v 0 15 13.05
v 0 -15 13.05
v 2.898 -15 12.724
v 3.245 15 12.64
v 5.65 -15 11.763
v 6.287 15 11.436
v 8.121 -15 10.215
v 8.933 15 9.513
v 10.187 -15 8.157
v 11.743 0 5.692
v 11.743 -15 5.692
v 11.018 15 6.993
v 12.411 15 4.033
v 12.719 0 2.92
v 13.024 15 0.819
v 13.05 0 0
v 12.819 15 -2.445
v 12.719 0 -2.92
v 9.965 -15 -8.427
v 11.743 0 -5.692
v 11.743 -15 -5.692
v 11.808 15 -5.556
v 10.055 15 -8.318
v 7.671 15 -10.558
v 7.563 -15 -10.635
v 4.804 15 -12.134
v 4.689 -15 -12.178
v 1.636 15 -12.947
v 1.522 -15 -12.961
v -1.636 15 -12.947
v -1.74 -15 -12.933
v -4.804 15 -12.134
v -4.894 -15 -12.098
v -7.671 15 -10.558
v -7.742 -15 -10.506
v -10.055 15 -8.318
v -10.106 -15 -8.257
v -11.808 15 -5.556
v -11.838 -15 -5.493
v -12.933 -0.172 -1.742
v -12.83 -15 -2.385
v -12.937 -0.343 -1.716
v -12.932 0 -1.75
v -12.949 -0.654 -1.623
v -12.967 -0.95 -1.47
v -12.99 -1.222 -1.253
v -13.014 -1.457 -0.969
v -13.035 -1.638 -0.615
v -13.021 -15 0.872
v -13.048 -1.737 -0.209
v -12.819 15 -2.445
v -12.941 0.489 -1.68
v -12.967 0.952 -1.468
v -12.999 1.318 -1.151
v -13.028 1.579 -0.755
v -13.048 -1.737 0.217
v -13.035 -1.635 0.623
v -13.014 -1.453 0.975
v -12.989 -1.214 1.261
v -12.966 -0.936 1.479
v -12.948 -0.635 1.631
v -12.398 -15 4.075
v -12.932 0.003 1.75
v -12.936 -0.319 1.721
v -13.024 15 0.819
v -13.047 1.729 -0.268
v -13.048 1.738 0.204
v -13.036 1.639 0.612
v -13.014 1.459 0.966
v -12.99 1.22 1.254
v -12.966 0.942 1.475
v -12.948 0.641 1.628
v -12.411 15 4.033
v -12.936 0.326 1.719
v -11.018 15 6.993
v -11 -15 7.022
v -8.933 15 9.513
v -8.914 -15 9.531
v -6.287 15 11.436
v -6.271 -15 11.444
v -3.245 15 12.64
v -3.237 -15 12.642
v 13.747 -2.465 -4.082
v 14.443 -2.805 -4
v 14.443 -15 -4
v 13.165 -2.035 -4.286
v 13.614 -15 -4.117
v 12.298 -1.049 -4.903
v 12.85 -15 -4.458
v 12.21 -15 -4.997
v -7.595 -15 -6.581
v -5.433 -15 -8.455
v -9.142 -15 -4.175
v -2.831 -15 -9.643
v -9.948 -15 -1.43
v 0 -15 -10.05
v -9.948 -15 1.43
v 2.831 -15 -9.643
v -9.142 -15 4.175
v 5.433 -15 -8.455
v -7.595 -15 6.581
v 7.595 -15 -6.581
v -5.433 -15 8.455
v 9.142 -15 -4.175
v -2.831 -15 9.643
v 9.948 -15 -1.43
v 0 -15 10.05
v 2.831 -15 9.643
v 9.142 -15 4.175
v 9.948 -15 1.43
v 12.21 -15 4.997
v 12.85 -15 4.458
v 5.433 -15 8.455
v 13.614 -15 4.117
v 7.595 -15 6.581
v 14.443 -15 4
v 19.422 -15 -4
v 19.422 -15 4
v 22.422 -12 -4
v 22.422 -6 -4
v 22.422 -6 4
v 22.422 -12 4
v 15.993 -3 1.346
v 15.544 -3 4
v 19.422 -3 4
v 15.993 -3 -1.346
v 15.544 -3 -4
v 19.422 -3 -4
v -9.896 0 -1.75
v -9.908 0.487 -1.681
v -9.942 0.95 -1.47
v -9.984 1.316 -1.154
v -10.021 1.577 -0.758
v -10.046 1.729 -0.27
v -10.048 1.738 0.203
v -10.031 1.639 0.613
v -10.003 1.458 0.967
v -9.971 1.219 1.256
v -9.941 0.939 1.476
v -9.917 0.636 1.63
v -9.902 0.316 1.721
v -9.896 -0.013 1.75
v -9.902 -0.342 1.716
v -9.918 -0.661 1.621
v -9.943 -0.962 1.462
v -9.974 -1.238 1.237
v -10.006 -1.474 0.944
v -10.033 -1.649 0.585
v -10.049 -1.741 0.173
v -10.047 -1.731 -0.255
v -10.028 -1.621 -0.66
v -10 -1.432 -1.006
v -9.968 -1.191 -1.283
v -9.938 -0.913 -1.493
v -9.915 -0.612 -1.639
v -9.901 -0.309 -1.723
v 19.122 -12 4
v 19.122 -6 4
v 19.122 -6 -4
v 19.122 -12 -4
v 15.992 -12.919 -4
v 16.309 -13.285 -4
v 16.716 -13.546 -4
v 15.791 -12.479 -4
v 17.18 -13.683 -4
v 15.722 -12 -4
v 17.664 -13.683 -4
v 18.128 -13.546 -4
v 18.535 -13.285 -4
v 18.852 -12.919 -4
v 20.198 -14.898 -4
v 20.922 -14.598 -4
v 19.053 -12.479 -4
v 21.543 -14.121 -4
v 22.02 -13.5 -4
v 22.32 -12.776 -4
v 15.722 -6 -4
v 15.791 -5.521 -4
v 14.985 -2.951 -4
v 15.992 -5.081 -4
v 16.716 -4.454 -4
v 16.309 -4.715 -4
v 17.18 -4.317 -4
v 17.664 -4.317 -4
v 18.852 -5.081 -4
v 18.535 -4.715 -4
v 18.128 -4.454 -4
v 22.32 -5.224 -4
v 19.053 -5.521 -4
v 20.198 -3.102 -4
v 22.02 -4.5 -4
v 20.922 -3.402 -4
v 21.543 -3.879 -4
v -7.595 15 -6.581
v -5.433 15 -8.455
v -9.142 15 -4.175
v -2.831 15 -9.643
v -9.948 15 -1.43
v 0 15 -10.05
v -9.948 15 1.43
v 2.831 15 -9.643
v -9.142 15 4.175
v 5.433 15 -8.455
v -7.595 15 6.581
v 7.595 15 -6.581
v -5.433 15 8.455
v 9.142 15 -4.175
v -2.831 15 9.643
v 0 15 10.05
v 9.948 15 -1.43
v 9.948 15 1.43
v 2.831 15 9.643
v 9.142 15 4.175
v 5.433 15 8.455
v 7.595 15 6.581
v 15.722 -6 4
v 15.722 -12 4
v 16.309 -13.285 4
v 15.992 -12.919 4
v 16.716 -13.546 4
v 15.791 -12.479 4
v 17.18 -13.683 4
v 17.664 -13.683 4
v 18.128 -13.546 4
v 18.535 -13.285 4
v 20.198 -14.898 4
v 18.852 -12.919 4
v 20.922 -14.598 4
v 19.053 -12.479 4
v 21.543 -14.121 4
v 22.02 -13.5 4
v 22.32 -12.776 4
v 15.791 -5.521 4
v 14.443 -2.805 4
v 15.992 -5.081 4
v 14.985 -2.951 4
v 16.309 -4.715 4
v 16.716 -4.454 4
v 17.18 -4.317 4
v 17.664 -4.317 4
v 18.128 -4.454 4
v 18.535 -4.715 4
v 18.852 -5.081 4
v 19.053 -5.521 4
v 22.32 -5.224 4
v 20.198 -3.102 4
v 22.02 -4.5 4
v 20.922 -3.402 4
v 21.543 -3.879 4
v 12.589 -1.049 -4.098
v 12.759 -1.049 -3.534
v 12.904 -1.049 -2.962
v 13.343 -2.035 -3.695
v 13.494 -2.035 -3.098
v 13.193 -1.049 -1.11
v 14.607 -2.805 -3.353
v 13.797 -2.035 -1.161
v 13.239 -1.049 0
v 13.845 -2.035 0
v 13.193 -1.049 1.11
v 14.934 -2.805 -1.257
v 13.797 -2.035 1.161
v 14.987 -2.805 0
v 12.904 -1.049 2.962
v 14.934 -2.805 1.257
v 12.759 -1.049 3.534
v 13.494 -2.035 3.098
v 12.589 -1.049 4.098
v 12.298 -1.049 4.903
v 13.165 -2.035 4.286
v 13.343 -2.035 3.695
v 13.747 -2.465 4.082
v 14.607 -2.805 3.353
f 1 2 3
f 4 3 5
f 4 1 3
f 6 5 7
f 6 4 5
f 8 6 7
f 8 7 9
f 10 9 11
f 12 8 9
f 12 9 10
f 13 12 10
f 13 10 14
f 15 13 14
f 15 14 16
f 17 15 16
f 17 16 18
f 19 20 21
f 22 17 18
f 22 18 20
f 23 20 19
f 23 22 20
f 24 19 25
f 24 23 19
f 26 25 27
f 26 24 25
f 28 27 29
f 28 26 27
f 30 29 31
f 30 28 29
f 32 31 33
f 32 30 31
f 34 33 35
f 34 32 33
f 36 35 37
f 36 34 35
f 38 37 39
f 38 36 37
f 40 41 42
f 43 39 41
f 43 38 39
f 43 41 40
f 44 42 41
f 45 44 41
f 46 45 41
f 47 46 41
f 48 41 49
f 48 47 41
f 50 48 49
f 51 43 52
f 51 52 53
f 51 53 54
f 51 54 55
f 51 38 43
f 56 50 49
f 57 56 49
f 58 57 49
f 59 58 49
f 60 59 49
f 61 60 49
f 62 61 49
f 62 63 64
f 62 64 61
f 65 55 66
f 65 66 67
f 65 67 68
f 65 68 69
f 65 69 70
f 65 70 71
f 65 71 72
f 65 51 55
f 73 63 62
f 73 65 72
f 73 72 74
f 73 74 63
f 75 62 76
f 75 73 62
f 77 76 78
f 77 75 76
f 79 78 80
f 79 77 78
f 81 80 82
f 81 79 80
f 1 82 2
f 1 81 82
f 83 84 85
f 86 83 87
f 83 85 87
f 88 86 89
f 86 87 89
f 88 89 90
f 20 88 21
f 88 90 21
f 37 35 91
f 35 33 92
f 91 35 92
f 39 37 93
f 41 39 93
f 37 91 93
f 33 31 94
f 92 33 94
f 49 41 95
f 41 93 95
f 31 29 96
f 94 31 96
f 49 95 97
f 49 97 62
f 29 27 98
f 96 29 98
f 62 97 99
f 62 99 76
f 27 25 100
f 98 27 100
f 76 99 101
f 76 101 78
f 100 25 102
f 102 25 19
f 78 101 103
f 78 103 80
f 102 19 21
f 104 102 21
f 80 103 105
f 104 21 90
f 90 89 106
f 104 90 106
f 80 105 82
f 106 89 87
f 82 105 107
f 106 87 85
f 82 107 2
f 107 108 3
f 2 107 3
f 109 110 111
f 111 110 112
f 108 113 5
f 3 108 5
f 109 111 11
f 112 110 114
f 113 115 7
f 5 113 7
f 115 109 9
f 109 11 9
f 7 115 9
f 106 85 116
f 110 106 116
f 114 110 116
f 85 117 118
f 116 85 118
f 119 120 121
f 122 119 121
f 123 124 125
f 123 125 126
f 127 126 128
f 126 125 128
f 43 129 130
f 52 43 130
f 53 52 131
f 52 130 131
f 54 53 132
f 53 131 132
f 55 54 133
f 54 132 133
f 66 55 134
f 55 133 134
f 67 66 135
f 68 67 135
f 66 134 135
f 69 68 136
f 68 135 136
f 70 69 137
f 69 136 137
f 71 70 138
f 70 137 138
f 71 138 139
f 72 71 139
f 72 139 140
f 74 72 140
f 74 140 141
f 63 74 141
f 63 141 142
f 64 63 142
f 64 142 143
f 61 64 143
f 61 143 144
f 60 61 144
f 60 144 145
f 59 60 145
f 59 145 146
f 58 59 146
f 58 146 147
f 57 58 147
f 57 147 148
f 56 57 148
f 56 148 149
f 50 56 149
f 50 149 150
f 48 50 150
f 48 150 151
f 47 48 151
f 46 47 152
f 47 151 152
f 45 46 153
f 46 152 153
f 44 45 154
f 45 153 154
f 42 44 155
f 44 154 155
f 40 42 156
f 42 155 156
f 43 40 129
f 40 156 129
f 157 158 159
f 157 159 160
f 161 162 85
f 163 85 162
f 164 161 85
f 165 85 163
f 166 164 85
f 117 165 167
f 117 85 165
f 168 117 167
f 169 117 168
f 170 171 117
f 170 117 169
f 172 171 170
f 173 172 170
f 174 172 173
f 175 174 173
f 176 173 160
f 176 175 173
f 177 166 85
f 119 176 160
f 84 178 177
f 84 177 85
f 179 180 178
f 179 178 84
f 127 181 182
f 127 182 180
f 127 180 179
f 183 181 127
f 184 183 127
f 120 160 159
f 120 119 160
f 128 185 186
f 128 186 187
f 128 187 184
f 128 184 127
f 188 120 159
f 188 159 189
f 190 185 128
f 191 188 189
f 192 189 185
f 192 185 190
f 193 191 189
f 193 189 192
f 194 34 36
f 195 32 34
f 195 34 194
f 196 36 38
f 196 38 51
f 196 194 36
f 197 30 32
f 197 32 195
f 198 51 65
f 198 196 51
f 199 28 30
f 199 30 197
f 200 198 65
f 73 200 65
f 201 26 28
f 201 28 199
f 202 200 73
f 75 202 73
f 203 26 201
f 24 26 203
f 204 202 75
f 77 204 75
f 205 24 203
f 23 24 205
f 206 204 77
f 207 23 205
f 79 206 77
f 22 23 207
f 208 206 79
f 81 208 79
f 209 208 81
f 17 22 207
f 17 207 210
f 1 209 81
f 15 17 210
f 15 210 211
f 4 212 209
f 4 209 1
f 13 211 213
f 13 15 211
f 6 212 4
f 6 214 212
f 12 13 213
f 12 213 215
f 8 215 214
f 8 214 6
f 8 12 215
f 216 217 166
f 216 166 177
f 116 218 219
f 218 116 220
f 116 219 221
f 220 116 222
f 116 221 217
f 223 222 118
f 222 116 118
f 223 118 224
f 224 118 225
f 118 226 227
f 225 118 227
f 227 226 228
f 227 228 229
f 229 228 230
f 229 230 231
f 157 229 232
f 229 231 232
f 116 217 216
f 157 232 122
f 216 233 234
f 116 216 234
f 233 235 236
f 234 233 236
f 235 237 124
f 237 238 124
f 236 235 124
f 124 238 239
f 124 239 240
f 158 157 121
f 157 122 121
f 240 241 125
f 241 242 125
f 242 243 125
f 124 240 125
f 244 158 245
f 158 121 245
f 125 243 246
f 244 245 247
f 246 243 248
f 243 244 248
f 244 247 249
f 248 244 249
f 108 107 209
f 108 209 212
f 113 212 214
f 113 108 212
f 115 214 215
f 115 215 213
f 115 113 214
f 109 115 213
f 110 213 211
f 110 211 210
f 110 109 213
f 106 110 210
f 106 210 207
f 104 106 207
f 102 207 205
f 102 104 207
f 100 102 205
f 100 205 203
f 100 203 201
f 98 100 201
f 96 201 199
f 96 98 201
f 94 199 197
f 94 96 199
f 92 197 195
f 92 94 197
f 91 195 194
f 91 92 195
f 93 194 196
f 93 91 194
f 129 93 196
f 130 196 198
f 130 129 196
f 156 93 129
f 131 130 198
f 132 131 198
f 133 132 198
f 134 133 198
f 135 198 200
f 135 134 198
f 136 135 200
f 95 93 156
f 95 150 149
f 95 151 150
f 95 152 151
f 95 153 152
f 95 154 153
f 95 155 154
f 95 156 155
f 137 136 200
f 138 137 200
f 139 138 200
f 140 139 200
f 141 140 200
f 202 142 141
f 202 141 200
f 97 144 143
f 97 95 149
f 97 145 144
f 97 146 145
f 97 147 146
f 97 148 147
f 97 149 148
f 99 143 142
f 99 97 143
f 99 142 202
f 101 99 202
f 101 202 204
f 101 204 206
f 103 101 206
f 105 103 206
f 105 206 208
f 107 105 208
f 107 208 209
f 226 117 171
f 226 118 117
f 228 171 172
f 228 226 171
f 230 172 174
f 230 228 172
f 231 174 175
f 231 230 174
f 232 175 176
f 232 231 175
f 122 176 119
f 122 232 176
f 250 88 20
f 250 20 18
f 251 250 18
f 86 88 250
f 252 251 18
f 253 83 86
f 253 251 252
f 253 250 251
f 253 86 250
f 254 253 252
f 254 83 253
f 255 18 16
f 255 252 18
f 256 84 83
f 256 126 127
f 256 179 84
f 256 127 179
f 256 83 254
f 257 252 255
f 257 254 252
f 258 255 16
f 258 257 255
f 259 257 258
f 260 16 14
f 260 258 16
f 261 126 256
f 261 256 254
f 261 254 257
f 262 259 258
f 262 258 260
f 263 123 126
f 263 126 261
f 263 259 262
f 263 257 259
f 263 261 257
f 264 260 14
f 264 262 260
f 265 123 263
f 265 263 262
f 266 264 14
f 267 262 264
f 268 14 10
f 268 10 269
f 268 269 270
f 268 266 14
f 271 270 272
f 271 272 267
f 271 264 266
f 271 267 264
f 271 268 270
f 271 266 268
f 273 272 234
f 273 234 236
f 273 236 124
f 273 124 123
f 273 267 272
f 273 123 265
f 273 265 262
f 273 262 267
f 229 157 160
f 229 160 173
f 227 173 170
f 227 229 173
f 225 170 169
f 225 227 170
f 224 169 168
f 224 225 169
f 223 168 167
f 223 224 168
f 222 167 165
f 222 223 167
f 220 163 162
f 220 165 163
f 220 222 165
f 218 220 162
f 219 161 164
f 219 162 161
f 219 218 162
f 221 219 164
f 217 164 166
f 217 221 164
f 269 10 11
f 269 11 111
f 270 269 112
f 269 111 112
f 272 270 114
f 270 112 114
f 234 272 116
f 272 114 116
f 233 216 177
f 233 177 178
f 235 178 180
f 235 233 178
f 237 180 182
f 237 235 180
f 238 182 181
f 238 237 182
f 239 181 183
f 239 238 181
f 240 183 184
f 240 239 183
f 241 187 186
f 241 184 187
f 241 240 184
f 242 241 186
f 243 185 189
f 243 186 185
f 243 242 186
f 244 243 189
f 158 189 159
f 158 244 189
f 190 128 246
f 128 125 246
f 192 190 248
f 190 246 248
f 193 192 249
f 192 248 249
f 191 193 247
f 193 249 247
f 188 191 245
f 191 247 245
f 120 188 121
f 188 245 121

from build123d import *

# Parameters (mm, degrees)
SKETCH_1_R             = 13.05
SKETCH_1_R_2           = 10.05
EXTRUDE_1_DEPTH        = 15
EXTRUDE_2_REACH        = 35.782
EXTRUDE_2_START_RADIUS = 13.05
EXTRUDE_2_END_RADIUS   = 13.05
SKETCH_2_W             = 8
SKETCH_2_H             = 12
CUT_EXTRUDE_1_DEPTH    = 33.025068306
CUT_EXTRUDE_2_DEPTH    = 32.913039886
FILLET_1_R             = 3
FILLET_2_R             = 3
SKETCH_6_R             = 1.75
CUT_EXTRUDE_3_DEPTH    = 30.967350938


with BuildPart() as part:
    # 草图1 → 凸台-拉伸1 (new, symmetric)
    with BuildSketch(Plane(origin=(0, 0, 0), x_dir=(1, 0, 0), z_dir=(0, 1, 0))):
        with Locations(Location((0, 0, 0), (0, 0, 270))):
            Circle(SKETCH_1_R)
        with Locations(Location((0, 0, 0), (0, 0, 270))):
            Circle(SKETCH_1_R_2, mode=Mode.SUBTRACT)
    extrude(amount=EXTRUDE_1_DEPTH, both=True)

    # 凸台-拉伸2: from a cylinder face, 35.782 long prism both ways, kept between that surface and its translate by the depth
    extrude_2_start = Plane(origin=(0, -9, 0), z_dir=(0, -1, 0)) * Cylinder(EXTRUDE_2_START_RADIUS, 98.664, mode=Mode.PRIVATE)
    extrude_2_end = Plane(origin=(10, -9, 0), z_dir=(0, -1, 0)) * Cylinder(EXTRUDE_2_END_RADIUS, 98.664, mode=Mode.PRIVATE)
    # 草图2 → 凸台-拉伸2 (add, from a surface)
    with BuildSketch(Plane(origin=(0, 0, 0), x_dir=(0, 0, -1), z_dir=(1, 0, 0)), mode=Mode.PRIVATE) as extrude_2_sk1:
        with Locations((0, -9)):
            Rectangle(SKETCH_2_W, SKETCH_2_H)
    extrude_2_tool1 = extrude(extrude_2_sk1.sketch, amount=EXTRUDE_2_REACH, both=True, mode=Mode.PRIVATE)
    add(((extrude_2_tool1 - extrude_2_start) & extrude_2_end).solids().sort_by_distance((17.421856, -9, 0))[0])

    # 草图4 → 切除-拉伸1 (cut, through all)
    with BuildSketch(Plane(origin=(0, -3, 0), x_dir=(1, 0, 0), z_dir=(0, 1, 0))):
        with BuildLine():
            Line((22.421855739, 4), (22.421855739, -4))
            ThreePointArc((22.421855739, -4), (23.05, 0), (22.421855739, 4))
        make_face()
    extrude(amount=-CUT_EXTRUDE_1_DEPTH, mode=Mode.SUBTRACT)

    # 草图5 → 切除-拉伸2 (cut, through all)
    with BuildSketch(Plane.XY.offset(4)):
        with BuildLine():
            Line((15.721855739, -12), (15.721855739, -6))
            ThreePointArc((15.721855739, -6), (17.421855739, -4.3), (19.121855739, -6))
            Line((19.121855739, -6), (19.121855739, -12))
            ThreePointArc((19.121855739, -12), (17.421855739, -13.7), (15.721855739, -12))
        make_face()
    extrude(amount=-CUT_EXTRUDE_2_DEPTH, mode=Mode.SUBTRACT)

    # 圆角1
    fillet_1_edges = [part.edges().sort_by_distance(p)[0] for p in [
        (22.421855739, -15, 0),
        (22.421855739, -3, 0),
    ]]
    fillet(fillet_1_edges, radius=FILLET_1_R)

    # 圆角2
    fillet_2_edges = [part.edges().sort_by_distance(p)[0] for p in [
        (12.421855739, -9, -4),
        (13.05, -3, 0),
        (12.421855739, -9, 4),
    ]]
    fillet(fillet_2_edges, radius=FILLET_2_R)

    # 草图6 → 切除-拉伸3 (cut, through all)
    with BuildSketch(Plane(origin=(0, 0, 0), x_dir=(0, 0, -1), z_dir=(1, 0, 0))):
        Circle(SKETCH_6_R)
    extrude(amount=-CUT_EXTRUDE_3_DEPTH, mode=Mode.SUBTRACT)


solid = part.part
